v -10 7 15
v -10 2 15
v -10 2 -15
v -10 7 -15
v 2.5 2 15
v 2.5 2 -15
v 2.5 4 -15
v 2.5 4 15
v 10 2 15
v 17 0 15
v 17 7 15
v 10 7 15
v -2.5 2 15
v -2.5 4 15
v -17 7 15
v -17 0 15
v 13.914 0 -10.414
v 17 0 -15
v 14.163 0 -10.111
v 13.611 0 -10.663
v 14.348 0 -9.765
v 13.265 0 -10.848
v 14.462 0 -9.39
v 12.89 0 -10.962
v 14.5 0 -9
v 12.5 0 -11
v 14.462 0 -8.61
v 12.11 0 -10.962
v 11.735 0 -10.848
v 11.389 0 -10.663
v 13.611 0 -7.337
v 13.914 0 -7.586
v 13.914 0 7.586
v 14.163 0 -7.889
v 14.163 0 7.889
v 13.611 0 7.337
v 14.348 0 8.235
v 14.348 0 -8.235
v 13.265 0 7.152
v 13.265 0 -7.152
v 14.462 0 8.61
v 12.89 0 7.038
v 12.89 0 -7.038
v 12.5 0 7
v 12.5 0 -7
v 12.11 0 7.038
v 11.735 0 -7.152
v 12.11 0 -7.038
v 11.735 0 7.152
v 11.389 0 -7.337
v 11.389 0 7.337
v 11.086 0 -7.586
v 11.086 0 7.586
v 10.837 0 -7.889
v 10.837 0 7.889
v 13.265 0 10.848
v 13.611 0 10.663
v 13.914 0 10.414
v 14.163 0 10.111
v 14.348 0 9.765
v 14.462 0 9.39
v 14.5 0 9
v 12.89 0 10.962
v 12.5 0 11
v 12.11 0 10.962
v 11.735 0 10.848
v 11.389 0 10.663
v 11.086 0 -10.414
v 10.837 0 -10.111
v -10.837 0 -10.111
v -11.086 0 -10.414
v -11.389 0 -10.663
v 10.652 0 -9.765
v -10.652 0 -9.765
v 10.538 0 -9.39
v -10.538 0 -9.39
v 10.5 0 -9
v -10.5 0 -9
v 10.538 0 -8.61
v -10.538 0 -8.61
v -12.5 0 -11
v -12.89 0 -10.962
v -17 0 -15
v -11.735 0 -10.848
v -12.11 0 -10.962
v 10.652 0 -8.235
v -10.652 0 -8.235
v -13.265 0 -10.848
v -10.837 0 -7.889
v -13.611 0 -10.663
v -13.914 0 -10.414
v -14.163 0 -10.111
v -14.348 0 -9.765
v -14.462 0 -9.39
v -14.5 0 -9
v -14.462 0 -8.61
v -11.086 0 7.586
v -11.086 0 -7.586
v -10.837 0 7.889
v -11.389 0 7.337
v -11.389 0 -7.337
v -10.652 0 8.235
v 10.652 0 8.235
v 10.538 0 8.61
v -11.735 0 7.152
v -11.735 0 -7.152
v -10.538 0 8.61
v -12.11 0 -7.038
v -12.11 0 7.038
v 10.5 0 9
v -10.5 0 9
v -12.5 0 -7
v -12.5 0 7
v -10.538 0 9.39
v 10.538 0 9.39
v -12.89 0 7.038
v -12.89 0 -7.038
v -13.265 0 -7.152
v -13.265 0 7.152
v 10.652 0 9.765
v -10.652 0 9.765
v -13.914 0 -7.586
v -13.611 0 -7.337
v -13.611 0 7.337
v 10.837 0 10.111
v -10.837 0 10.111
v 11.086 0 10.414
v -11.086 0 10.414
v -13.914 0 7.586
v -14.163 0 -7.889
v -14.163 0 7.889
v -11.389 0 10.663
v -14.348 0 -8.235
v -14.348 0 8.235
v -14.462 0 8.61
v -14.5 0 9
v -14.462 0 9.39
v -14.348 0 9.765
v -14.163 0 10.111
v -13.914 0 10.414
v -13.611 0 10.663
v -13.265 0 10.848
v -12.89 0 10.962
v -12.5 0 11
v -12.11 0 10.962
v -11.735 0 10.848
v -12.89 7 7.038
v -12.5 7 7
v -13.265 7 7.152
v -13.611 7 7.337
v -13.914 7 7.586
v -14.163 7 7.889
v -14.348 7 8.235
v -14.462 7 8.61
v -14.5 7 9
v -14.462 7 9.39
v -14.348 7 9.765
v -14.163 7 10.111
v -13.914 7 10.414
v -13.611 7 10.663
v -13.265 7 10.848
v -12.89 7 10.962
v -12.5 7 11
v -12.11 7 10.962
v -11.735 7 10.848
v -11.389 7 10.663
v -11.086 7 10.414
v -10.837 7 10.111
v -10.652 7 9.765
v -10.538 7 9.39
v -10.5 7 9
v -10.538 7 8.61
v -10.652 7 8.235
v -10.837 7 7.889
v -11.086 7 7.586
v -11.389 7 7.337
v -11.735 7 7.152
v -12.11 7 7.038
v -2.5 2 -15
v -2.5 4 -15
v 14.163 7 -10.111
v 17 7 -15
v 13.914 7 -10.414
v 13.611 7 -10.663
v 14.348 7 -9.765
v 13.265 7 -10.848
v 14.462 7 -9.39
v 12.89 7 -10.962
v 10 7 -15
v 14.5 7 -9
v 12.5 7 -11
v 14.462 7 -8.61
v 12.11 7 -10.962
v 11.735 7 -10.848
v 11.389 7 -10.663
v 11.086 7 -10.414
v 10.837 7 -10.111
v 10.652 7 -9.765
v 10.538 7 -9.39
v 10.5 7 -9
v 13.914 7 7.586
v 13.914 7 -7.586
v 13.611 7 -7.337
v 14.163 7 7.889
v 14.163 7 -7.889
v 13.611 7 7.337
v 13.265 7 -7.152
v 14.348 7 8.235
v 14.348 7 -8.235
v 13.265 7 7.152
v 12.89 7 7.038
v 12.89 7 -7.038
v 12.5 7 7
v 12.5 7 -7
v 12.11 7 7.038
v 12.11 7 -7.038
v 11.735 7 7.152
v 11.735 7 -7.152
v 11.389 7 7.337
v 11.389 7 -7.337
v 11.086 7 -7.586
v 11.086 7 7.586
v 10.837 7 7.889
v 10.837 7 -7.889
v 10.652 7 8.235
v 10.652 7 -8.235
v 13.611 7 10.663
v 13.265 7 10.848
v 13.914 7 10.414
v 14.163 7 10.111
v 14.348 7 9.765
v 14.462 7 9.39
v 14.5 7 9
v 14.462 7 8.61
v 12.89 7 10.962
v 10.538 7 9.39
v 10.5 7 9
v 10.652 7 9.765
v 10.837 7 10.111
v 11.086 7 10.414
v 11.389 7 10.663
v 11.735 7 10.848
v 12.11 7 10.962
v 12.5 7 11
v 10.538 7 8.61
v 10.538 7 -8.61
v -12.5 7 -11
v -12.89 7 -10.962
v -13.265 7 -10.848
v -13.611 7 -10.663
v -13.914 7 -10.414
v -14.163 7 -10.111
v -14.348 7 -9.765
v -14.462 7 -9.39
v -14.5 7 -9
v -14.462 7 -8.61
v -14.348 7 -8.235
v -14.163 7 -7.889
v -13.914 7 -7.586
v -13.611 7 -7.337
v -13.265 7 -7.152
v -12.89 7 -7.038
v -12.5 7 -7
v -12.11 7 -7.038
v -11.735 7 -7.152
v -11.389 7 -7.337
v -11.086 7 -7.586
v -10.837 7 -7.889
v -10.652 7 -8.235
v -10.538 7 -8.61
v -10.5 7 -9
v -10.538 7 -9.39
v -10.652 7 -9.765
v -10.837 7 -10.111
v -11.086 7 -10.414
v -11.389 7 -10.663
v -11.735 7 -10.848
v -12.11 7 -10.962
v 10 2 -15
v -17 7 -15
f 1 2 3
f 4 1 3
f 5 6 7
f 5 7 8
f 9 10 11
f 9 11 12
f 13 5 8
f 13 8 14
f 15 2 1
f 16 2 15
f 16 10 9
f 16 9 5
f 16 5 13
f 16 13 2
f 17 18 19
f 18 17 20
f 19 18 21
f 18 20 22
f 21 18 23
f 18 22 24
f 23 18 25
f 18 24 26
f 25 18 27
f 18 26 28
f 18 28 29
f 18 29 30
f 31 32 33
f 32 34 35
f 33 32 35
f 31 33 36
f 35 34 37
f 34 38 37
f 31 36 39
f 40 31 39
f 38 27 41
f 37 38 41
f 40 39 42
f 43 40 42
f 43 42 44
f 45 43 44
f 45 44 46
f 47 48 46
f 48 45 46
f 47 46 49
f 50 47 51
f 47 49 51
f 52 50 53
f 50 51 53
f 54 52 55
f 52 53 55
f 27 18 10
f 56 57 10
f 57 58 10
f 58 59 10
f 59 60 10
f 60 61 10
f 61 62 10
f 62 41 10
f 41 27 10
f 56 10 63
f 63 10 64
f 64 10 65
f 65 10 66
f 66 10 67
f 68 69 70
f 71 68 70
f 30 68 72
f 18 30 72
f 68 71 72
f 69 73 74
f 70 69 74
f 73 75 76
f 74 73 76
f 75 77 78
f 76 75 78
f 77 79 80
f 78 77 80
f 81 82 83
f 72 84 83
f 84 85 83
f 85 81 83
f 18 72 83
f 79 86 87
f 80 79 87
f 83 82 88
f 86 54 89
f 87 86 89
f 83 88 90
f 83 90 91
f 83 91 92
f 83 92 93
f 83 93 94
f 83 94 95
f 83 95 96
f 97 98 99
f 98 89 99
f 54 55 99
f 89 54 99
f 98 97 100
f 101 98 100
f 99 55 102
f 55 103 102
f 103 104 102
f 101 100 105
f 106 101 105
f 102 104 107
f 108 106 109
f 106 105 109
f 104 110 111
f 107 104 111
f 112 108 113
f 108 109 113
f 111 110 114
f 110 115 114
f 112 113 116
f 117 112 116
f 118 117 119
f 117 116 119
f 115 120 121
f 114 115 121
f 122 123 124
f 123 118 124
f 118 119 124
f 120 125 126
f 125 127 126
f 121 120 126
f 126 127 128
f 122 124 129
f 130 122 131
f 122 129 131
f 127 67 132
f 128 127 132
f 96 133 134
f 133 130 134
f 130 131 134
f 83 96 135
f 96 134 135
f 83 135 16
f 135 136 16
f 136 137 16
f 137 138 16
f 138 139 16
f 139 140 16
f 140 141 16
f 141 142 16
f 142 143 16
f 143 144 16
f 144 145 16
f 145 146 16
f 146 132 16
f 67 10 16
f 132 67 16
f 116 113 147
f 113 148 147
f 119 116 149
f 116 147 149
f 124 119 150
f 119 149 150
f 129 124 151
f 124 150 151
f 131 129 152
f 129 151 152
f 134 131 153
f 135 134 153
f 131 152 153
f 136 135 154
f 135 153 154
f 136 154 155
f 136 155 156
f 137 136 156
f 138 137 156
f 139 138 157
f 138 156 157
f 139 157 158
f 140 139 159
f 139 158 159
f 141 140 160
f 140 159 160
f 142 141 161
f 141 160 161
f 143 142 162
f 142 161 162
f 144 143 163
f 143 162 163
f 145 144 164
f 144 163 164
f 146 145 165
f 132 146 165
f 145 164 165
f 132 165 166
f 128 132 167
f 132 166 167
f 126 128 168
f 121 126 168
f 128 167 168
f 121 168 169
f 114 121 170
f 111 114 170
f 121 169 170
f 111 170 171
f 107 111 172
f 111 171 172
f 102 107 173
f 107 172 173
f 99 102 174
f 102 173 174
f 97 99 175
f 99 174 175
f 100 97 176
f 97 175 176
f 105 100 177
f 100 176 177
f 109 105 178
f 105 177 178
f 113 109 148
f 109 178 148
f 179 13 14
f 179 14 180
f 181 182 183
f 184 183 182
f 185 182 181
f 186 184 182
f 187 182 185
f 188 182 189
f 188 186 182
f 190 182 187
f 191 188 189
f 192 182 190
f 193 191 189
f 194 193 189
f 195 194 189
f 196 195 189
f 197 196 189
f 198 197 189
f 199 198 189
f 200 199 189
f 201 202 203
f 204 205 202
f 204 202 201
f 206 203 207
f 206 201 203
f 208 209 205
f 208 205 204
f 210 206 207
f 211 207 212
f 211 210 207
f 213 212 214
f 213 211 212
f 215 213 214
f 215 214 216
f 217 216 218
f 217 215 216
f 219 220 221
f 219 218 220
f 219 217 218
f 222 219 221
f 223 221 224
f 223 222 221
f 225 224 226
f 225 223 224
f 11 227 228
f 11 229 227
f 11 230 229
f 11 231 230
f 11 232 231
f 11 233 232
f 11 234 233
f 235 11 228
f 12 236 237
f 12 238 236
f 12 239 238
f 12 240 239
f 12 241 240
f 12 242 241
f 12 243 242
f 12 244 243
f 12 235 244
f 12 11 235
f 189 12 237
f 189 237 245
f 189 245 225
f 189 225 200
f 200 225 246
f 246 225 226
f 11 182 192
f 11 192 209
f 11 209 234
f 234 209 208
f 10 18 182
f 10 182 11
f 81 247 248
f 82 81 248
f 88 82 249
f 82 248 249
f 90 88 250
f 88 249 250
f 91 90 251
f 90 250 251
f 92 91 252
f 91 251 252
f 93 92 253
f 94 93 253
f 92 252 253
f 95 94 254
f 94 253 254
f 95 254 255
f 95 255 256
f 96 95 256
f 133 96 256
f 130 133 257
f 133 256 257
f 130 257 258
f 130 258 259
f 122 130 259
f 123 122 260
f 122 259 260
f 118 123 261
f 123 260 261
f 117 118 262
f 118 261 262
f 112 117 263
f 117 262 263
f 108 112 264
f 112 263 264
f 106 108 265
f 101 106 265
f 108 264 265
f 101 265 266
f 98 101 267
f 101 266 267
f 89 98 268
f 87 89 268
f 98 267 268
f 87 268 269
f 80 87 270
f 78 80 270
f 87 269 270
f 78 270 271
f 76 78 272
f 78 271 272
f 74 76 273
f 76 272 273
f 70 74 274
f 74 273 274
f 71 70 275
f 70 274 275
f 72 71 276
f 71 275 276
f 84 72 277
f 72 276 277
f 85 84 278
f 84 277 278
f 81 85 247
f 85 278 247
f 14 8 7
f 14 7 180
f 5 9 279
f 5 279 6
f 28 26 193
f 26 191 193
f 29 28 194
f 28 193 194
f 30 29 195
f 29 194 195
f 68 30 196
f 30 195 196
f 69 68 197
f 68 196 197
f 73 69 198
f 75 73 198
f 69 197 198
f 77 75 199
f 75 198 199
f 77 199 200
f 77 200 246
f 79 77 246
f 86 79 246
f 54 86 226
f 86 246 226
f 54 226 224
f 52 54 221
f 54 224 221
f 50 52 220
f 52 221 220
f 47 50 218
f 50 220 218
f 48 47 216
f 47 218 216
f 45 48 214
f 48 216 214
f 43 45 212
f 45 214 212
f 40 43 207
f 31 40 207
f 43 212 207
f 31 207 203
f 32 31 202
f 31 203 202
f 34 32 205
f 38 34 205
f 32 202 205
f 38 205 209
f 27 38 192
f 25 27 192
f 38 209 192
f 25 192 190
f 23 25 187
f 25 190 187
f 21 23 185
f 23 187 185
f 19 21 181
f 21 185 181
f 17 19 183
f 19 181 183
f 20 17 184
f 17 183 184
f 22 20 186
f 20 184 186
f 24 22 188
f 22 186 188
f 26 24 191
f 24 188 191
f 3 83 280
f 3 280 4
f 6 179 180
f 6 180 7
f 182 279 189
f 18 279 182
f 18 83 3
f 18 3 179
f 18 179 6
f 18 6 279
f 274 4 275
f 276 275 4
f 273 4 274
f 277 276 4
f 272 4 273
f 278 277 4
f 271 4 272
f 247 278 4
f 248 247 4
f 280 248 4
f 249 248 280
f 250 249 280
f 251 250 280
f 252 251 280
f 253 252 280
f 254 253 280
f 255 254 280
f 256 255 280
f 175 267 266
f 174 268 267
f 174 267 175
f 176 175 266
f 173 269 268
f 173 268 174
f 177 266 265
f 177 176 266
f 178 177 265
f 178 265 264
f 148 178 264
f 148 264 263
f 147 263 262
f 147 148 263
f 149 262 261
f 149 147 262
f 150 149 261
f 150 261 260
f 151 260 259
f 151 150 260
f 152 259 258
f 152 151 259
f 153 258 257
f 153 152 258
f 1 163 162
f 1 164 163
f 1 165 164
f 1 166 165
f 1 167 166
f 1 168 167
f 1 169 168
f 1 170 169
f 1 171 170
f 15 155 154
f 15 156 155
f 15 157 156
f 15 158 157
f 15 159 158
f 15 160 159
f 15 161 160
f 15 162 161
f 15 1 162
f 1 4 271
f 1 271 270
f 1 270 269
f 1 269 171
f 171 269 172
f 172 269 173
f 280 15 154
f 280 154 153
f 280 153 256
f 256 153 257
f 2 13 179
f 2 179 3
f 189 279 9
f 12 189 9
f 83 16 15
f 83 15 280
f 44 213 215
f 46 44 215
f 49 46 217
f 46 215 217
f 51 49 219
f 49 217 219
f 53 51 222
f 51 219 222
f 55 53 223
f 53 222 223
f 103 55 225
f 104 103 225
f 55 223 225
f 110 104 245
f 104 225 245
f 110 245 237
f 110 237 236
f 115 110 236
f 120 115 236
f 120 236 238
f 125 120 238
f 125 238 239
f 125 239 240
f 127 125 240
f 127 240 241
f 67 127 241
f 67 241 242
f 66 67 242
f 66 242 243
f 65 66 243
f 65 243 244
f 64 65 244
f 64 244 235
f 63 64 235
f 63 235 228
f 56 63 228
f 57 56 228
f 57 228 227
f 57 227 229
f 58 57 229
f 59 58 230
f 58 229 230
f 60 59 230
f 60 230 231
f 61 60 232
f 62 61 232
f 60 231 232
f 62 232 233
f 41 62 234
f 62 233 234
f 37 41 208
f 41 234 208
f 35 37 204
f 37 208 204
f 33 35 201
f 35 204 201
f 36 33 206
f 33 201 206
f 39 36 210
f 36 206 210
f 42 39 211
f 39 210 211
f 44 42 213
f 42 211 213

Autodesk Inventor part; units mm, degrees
ref_plane "YZ Plane" through (0, 0, 0) normal (1, 0, 0) x (0, 1, 0)
ref_plane "XZ Plane" through (0, 0, 0) normal (0, 1, 0) x (-1, 0, 0)
ref_plane "XY Plane" through (0, 0, 0) normal (0, 0, 1) x (1, 0, 0)
sketch "Sketch1" plane through (0, 0, 0) normal (0, 1, 0) x (-1, 0, 0)
  line L0 (-17, 15) -> (17, 15)
  line L1 (17, 15) -> (17, -15)
  line L2 (17, -15) -> (-17, -15)
  line L3 (-17, -15) -> (-17, 15)
  line L4 (-17, 15) -> (17, -15) construction
  line L5 (17, 15) -> (-17, -15) construction
  line L6 (-10, 15) -> (10, 15)
  line L7 (10, 15) -> (10, -15)
  line L8 (10, -15) -> (-10, -15)
  line L9 (-10, -15) -> (-10, 15)
  line L10 (-10, 15) -> (10, -15) construction
  line L11 (10, 15) -> (-10, -15) construction
  line L12 (-2.5, 15) -> (2.5, 15)
  line L13 (2.5, 15) -> (2.5, -15)
  line L14 (2.5, -15) -> (-2.5, -15)
  line L15 (-2.5, -15) -> (-2.5, 15)
  line L16 (-2.5, 15) -> (2.5, -15) construction
  line L17 (2.5, 15) -> (-2.5, -15) construction
  point P0 (0, 0)
  point P1 (12.5, 9)
  dimension "d0" = 20
  dimension "d1" = 5
  dimension "d2" = 34
  dimension "d3" = 30
  dimension "d4" = 6
  dimension "d5" = 4.5
extrude "Extrusion1" add sketch "Sketch1" along normal blind 2 contours L0 L15 L2 L9 | L0 L7 L2 L13
extrude "Extrusion2" add sketch "Sketch1" along normal blind 7 contours L0 L9 L2 L3 | L0 L1 L2 L7
extrude "Extrusion3" add sketch "Sketch1" along normal blind 4 contours L0 L13 L2 L15
hole "Hole1" at (-12.5, 0, 9) direction (0, 1, 0) diameter 4 end through all
pattern_linear "Rectangular Pattern1" count 2 spacing 18 along (0, 0, -1) count 2 spacing 25 along (1, 0, 0) of "Hole1"
properties part number "Linear Bearing Platform Adapter Back" material "PC/ABS Plastic"
